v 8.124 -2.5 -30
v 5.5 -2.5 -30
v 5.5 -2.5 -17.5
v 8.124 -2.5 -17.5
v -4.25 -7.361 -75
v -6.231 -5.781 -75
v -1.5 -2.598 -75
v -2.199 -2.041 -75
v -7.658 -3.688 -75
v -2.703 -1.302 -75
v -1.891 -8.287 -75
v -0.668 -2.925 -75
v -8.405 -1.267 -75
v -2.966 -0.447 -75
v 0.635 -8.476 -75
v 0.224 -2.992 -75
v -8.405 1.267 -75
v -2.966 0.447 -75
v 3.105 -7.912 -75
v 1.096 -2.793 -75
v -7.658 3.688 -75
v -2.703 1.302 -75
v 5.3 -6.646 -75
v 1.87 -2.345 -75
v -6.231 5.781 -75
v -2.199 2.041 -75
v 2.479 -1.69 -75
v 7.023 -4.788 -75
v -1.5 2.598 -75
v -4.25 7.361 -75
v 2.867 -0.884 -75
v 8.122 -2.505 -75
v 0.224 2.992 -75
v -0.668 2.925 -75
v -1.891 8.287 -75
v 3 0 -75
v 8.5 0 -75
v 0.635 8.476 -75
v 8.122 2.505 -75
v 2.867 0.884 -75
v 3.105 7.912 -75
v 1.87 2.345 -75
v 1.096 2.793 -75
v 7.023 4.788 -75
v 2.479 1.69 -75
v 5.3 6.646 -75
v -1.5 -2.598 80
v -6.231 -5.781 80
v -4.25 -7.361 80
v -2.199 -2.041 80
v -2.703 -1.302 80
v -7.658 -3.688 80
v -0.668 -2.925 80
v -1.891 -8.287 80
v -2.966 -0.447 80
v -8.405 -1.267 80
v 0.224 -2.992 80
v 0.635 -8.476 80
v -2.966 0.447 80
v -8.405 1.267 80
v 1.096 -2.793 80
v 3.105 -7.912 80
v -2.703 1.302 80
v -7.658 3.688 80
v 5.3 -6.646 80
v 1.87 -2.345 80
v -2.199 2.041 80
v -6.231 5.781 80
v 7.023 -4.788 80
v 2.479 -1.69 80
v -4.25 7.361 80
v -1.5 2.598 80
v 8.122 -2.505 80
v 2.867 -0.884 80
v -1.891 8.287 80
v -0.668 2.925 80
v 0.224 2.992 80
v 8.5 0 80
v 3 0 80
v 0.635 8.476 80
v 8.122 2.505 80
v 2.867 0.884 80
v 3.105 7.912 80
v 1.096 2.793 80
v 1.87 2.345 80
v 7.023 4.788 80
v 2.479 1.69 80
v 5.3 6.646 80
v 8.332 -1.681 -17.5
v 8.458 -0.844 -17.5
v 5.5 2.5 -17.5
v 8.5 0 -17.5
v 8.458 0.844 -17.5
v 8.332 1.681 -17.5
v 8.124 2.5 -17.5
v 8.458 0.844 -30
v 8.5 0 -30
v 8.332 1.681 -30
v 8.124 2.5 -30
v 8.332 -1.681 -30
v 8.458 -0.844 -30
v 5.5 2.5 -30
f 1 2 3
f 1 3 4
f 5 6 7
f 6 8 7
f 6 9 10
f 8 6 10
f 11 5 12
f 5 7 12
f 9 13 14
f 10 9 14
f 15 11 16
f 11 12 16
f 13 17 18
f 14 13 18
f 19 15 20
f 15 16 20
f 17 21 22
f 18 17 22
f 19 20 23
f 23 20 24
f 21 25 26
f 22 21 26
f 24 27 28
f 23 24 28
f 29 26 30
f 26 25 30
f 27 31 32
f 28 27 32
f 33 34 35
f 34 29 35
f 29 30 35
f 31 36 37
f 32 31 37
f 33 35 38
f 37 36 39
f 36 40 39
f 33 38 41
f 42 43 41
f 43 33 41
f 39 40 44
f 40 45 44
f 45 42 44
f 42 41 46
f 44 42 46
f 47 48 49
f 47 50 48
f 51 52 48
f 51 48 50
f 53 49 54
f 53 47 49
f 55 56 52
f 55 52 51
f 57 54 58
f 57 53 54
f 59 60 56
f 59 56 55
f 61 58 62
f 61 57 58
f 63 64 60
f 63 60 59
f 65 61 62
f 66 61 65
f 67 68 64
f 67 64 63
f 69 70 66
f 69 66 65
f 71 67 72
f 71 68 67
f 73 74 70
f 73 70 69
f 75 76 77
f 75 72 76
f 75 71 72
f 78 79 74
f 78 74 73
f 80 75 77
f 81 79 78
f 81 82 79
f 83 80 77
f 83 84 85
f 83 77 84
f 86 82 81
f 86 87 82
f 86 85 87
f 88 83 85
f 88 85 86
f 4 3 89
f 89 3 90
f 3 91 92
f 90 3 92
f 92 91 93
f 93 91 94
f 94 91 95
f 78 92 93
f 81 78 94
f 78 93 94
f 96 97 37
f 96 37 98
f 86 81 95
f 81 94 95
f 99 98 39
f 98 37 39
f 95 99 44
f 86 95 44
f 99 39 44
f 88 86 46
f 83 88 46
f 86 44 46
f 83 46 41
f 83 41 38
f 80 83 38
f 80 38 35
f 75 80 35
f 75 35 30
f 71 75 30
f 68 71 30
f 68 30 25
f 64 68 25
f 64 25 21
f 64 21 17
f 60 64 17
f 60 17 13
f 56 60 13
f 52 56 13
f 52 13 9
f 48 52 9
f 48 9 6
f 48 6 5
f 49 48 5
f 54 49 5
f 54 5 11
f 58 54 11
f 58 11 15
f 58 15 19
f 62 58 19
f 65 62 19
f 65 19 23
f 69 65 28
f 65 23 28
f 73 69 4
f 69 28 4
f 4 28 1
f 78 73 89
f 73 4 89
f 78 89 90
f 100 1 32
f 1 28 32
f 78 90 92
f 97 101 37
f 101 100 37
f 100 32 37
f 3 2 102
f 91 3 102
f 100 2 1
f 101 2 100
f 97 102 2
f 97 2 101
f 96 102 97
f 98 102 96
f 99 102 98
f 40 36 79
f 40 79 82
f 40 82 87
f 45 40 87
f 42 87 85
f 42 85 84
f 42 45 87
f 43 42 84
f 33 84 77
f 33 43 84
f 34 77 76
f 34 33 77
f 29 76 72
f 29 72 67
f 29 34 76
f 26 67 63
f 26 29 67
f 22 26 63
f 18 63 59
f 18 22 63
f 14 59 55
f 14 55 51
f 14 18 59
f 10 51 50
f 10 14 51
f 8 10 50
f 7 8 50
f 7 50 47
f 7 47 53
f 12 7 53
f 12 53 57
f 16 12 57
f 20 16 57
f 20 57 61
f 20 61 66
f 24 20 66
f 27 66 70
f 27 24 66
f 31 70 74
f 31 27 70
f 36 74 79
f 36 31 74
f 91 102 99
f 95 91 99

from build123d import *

# Parameters (mm, degrees)
AXLE_ENVELOPE_START = -75
SKETCH_1_R          = 8.5
SKETCH_1_R_2        = 3
AXLE_ENVELOPE_DEPTH = 155
AXLE_KEYWAY_START   = -30
SKETCH_2_W          = 5
SKETCH_2_H          = 5
AXLE_KEYWAY_DEPTH   = 12.5


with BuildPart() as part:
    # Эскиз1 → Axle_envelope (new body)
    with BuildSketch(Plane.XY.offset(AXLE_ENVELOPE_START)):
        Circle(SKETCH_1_R)
        Circle(SKETCH_1_R_2, mode=Mode.SUBTRACT)
    extrude(amount=AXLE_ENVELOPE_DEPTH)

    # Эскиз2 → Axle_keyway (cut)
    with BuildSketch(Plane.XY.offset(AXLE_KEYWAY_START)):
        with Locations((8, 0)):
            Rectangle(SKETCH_2_W, SKETCH_2_H)
    extrude(amount=AXLE_KEYWAY_DEPTH, mode=Mode.SUBTRACT)


solid = part.part
